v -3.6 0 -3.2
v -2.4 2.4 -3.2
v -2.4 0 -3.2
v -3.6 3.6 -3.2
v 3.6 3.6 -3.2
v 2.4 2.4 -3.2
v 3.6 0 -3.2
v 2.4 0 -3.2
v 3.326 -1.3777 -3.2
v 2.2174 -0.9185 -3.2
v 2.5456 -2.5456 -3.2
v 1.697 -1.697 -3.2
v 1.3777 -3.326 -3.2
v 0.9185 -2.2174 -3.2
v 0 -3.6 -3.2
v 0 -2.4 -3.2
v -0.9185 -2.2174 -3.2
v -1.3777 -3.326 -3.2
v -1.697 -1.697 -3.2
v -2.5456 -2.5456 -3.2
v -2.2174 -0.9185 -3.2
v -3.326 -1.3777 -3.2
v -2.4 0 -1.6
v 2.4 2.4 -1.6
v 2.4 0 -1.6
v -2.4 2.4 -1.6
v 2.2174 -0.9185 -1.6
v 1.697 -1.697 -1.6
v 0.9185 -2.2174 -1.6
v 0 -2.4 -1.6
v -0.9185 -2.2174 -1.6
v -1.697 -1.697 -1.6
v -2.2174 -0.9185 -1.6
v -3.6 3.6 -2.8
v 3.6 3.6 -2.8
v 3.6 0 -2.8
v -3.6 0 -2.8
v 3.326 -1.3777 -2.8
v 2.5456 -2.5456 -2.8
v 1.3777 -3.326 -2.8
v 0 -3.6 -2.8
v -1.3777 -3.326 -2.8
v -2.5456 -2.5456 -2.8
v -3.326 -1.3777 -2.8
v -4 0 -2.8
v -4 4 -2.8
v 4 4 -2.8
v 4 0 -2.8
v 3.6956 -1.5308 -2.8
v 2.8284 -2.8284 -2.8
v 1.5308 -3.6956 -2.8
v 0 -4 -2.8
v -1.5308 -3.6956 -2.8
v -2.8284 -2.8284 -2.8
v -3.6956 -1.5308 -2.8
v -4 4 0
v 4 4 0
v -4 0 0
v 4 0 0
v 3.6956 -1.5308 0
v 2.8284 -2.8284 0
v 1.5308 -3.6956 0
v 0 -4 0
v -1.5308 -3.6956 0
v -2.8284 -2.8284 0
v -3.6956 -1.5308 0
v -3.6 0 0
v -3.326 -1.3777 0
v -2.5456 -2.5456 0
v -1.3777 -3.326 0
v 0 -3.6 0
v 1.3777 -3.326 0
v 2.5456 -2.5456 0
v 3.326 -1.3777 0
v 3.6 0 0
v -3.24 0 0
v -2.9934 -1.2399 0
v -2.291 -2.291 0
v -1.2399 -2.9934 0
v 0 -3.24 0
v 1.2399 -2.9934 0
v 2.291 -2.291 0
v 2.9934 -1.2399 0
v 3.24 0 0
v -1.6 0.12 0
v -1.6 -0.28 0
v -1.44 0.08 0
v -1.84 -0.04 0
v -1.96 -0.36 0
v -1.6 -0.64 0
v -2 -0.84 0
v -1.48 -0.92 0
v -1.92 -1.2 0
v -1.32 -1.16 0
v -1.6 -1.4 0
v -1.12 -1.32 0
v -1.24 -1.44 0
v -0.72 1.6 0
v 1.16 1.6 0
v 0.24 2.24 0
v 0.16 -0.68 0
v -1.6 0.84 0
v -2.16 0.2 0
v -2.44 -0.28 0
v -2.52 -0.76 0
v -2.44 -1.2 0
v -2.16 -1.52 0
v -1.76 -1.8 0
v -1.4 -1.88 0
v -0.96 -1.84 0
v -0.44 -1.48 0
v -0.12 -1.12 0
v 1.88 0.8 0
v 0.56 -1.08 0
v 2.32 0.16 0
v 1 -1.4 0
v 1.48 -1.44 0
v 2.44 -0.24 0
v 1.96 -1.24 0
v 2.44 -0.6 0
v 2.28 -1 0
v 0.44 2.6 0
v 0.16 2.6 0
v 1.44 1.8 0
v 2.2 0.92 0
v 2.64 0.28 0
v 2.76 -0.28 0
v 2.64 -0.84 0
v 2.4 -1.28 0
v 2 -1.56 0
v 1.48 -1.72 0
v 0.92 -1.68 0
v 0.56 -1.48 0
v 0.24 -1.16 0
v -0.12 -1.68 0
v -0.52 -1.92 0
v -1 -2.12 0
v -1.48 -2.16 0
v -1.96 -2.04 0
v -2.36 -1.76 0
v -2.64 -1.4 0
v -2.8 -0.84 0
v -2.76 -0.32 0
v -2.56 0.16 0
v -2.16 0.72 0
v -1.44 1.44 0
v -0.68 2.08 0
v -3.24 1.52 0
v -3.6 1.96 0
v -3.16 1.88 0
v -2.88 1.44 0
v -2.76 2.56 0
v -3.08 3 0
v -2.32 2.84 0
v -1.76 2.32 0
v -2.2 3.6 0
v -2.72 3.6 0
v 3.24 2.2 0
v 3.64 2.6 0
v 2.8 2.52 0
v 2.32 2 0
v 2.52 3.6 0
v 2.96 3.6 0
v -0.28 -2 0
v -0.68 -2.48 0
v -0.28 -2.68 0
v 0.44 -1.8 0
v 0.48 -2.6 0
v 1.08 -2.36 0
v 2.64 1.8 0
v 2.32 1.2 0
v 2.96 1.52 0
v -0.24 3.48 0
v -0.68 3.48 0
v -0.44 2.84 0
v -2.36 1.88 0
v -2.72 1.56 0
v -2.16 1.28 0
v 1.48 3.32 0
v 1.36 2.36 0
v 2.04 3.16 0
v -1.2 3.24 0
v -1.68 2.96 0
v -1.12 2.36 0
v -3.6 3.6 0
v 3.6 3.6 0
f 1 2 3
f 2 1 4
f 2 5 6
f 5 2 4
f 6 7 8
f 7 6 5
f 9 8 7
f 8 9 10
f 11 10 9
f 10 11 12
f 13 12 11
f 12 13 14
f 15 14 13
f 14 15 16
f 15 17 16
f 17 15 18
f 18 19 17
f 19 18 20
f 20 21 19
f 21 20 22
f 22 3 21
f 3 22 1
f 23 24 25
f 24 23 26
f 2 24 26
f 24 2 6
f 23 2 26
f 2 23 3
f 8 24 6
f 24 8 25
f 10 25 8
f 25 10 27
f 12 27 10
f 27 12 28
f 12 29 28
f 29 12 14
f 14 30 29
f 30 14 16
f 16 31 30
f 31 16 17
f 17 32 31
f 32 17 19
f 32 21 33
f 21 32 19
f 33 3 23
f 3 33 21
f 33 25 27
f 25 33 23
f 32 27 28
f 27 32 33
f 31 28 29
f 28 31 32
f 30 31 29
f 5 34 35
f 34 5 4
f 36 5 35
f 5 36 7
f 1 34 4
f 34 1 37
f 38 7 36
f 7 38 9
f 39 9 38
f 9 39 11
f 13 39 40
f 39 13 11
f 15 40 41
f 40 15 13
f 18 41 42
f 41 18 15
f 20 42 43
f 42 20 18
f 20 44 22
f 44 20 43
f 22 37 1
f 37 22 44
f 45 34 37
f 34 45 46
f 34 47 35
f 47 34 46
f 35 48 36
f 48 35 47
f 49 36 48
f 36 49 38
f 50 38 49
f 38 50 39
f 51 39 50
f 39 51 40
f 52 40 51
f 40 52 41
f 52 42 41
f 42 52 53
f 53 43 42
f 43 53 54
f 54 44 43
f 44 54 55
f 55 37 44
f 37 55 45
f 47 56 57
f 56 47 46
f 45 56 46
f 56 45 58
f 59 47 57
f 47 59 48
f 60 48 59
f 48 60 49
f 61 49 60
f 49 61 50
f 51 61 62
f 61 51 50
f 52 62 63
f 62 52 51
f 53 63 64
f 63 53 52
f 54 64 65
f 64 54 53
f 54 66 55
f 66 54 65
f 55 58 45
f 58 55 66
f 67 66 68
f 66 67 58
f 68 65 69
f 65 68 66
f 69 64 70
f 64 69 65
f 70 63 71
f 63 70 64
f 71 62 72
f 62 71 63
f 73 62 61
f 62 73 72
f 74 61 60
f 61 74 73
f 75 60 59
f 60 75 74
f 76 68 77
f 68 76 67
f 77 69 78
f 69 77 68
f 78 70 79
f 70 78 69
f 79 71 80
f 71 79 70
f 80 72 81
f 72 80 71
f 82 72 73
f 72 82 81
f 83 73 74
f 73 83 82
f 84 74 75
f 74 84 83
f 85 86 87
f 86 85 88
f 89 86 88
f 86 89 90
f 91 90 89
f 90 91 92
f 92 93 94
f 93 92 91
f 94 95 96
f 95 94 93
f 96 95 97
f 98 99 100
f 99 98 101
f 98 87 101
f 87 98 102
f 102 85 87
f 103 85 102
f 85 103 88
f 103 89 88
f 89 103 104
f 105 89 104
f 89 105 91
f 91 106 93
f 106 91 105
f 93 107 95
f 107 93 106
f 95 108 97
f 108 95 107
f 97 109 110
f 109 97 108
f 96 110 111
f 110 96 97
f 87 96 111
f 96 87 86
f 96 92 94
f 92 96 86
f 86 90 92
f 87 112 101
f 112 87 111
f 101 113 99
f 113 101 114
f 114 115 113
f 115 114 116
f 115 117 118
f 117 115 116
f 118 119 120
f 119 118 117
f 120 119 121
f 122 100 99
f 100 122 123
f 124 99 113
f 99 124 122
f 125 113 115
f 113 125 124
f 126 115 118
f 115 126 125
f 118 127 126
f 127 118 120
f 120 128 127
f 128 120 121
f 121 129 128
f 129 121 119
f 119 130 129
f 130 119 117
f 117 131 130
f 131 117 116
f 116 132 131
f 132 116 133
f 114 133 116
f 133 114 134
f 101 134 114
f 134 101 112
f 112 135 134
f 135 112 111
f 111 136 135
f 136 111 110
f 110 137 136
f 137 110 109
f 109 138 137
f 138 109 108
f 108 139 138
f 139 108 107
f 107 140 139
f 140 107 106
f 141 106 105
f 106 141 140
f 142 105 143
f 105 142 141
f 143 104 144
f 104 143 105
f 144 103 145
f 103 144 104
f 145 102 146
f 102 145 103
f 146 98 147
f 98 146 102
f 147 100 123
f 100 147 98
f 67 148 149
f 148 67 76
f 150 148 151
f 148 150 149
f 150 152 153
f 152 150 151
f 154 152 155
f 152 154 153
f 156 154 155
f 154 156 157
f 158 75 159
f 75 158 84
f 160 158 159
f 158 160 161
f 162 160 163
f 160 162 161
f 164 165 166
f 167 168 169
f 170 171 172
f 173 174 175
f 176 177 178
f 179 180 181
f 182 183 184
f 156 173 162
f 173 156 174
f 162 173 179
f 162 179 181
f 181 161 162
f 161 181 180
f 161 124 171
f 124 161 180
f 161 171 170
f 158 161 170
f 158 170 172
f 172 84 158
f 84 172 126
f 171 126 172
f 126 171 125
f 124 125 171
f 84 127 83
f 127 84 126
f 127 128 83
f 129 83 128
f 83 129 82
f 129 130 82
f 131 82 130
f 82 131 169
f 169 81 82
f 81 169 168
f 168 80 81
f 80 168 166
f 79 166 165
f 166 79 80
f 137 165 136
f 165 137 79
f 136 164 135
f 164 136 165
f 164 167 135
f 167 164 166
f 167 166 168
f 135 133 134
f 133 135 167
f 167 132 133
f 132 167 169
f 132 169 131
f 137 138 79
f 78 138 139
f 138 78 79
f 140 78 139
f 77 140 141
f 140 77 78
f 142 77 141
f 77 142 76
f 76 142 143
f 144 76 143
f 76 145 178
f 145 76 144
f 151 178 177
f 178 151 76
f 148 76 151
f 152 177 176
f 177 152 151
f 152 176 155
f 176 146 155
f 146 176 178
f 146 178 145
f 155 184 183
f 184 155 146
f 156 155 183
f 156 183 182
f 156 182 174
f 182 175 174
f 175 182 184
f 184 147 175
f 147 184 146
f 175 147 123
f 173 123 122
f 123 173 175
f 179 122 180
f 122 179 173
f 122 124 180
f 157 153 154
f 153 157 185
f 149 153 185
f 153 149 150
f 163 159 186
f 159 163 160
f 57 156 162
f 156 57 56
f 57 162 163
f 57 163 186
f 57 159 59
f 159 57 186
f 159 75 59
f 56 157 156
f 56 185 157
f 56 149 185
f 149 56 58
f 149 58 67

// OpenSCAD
// file: ../p/2-4edge.scad
use <../lib.scad>
function ldraw_lib__2_4edge() = [
// 0 Circle 0.5
// 0 Name: 2-4edge.dat
// 0 Author: James Jessiman
// 0 !LDRAW_ORG Primitive UPDATE 2017-01
// 0 !LICENSE Licensed under CC BY 4.0 : see CAreadme.txt
// 
// 0 BFC CERTIFY CCW
  [0,"BFC","CERTIFY"],
  [0,"BFC","CCW"],
// 
// 0 !HISTORY 2007-06-24 [PTadmin] Header formatted for Contributor Agreement
// 0 !HISTORY 2008-07-01 [PTadmin] Official Update 2008-01
// 0 !HISTORY 2017-01-15 [Steffen] BFCed
// 0 !HISTORY 2017-12-30 [PTadmin] Official Update 2017-01
// 
// 
// 2 24 1 0 0 0.9239 0 0.3827
  [2,24,1,0,0,0.9239,0,0.3827],
// 2 24 0.9239 0 0.3827 0.7071 0 0.7071
  [2,24,0.9239,0,0.3827,0.7071,0,0.7071],
// 2 24 0.7071 0 0.7071 0.3827 0 0.9239
  [2,24,0.7071,0,0.7071,0.3827,0,0.9239],
// 2 24 0.3827 0 0.9239 0 0 1
  [2,24,0.3827,0,0.9239,0,0,1],
// 2 24 0 0 1 -0.3827 0 0.9239
  [2,24,0,0,1,-0.3827,0,0.9239],
// 2 24 -0.3827 0 0.9239 -0.7071 0 0.7071
  [2,24,-0.3827,0,0.9239,-0.7071,0,0.7071],
// 2 24 -0.7071 0 0.7071 -0.9239 0 0.3827
  [2,24,-0.7071,0,0.7071,-0.9239,0,0.3827],
// 2 24 -0.9239 0 0.3827 -1 0 0
  [2,24,-0.9239,0,0.3827,-1,0,0],
];
module ldraw_lib__2_4edge(step=0, col=false, unit=2/5, alt=false, line=0.2, solid=!$preview)
    makepoly(ldraw_lib__2_4edge(), step=step, col=col, unit=unit, alt=alt, line=line, solid=solid);
ldraw_lib__2_4edge(line=0.2);
// file: ../p/2-4cyli.scad
use <../lib.scad>
function ldraw_lib__2_4cyli() = [
// 0 Cylinder 0.5
// 0 Name: 2-4cyli.dat
// 0 Author: James Jessiman
// 0 !LDRAW_ORG Primitive UPDATE 2005-01
// 0 !LICENSE Licensed under CC BY 4.0 : see CAreadme.txt
// 
// 0 BFC CERTIFY CCW
  [0,"BFC","CERTIFY"],
  [0,"BFC","CCW"],
// 
// 0 !HISTORY 2002-03-23 [sbliss] Added BFC statement; compacted code
// 0 !HISTORY 2002-04-25 [PTadmin] Official Update 2002-02
// 0 !HISTORY 2004-12-11 [nielsk] Recreated using Primitive Generator, Edge lines fixed, BFC changed to CCW
// 0 !HISTORY 2005-12-28 [PTadmin] Official Update 2005-01
// 0 !HISTORY 2007-06-24 [PTadmin] Header formatted for Contributor Agreement
// 0 !HISTORY 2008-07-01 [PTadmin] Official Update 2008-01
// 
// 
// 4 16 .9239 1 .3827 .9239 0 .3827 1 0 0 1 1 0
  [4,16,.9239,1,.3827,.9239,0,.3827,1,0,0,1,1,0],
// 4 16 .7071 1 .7071 .7071 0 .7071 .9239 0 .3827 .9239 1 .3827
  [4,16,.7071,1,.7071,.7071,0,.7071,.9239,0,.3827,.9239,1,.3827],
// 4 16 .3827 1 .9239 .3827 0 .9239 .7071 0 .7071 .7071 1 .7071
  [4,16,.3827,1,.9239,.3827,0,.9239,.7071,0,.7071,.7071,1,.7071],
// 4 16 0 1 1 0 0 1 .3827 0 .9239 .3827 1 .9239
  [4,16,0,1,1,0,0,1,.3827,0,.9239,.3827,1,.9239],
// 4 16 -.3827 1 .9239 -.3827 0 .9239 0 0 1 0 1 1
  [4,16,-.3827,1,.9239,-.3827,0,.9239,0,0,1,0,1,1],
// 4 16 -.7071 1 .7071 -.7071 0 .7071 -.3827 0 .9239 -.3827 1 .9239
  [4,16,-.7071,1,.7071,-.7071,0,.7071,-.3827,0,.9239,-.3827,1,.9239],
// 4 16 -.9239 1 .3827 -.9239 0 .3827 -.7071 0 .7071 -.7071 1 .7071
  [4,16,-.9239,1,.3827,-.9239,0,.3827,-.7071,0,.7071,-.7071,1,.7071],
// 4 16 -1 1 0 -1 0 0 -.9239 0 .3827 -.9239 1 .3827
  [4,16,-1,1,0,-1,0,0,-.9239,0,.3827,-.9239,1,.3827],
// 5 24 1 1 0 1 0 0 1 1 -.4142 .9239 1 .3827
  [5,24,1,1,0,1,0,0,1,1,-.4142,.9239,1,.3827],
// 5 24 .9239 1 .3827 .9239 0 .3827 1 1 0 .7071 1 .7071
  [5,24,.9239,1,.3827,.9239,0,.3827,1,1,0,.7071,1,.7071],
// 5 24 .7071 1 .7071 .7071 0 .7071 .9239 1 .3827 .3827 1 .9239
  [5,24,.7071,1,.7071,.7071,0,.7071,.9239,1,.3827,.3827,1,.9239],
// 5 24 .3827 1 .9239 .3827 0 .9239 .7071 1 .7071 0 1 1
  [5,24,.3827,1,.9239,.3827,0,.9239,.7071,1,.7071,0,1,1],
// 5 24 0 1 1 0 0 1 .3827 1 .9239 -.3827 1 .9239
  [5,24,0,1,1,0,0,1,.3827,1,.9239,-.3827,1,.9239],
// 5 24 -.3827 1 .9239 -.3827 0 .9239 0 1 1 -.7071 1 .7071
  [5,24,-.3827,1,.9239,-.3827,0,.9239,0,1,1,-.7071,1,.7071],
// 5 24 -.7071 1 .7071 -.7071 0 .7071 -.3827 1 .9239 -.9239 1 .3827
  [5,24,-.7071,1,.7071,-.7071,0,.7071,-.3827,1,.9239,-.9239,1,.3827],
// 5 24 -.9239 1 .3827 -.9239 0 .3827 -.7071 1 .7071 -1 1 0
  [5,24,-.9239,1,.3827,-.9239,0,.3827,-.7071,1,.7071,-1,1,0],
// 5 24 -1 1 0 -1 0 0 -.9239 1 .3827 -1 1 -.4142
  [5,24,-1,1,0,-1,0,0,-.9239,1,.3827,-1,1,-.4142],
// 0
];
module ldraw_lib__2_4cyli(step=0, col=false, unit=2/5, alt=false, line=0.2, solid=!$preview)
    makepoly(ldraw_lib__2_4cyli(), step=step, col=col, unit=unit, alt=alt, line=line, solid=solid);
ldraw_lib__2_4cyli(line=0.2);
// file: ../p/empty.scad
use <../lib.scad>
function ldraw_lib__empty() = [
// 0 Empty
// 0 Name: empty.dat
// 0 Author: Steffen [Steffen]
// 0 !LDRAW_ORG Primitive UPDATE 2015-01
// 0 !LICENSE Licensed under CC BY 4.0 : see CAreadme.txt
// 
// 0 BFC CERTIFY CCW
  [0,"BFC","CERTIFY"],
  [0,"BFC","CCW"],
// 
// 0 !HISTORY 2015-10-11 [PTadmin] Official Update 2015-01
// 
// 
// 0 // Tool MLCad cannot handle really empty files. This file is used as a workaround.
// 0 // It exceptionally contains forbidden non-LDRAW standard syntax to satisfy MLCad until it is fixed OR a different editor has become the de-facto LDRAW standard.
// 0 // The line being used here is an "impossible" conditional line which never should be visible,
// 0 // additionally hidden by a syntax explicitly hiding it from displaying.
// 
// 0 MLCAD HIDE 5 24 0 0 0 0.0001 0 0 0.0001 -0.0001 0 0 0 0
];
module ldraw_lib__empty(step=0, col=false, unit=2/5, alt=false, line=0.2, solid=!$preview)
    makepoly(ldraw_lib__empty(), step=step, col=col, unit=unit, alt=alt, line=line, solid=solid);
ldraw_lib__empty(line=0.2);
// file: ../p/box4-4a.scad
use <../lib.scad>
function ldraw_lib__box4_4a() = [
// 0 Box with  4 Faces without  4 Adjacent Edges
// 0 Name: box4-4a.dat
// 0 Author: Willy Tschager [Holly-Wood]
// 0 !LDRAW_ORG Primitive UPDATE 2024-01
// 0 !LICENSE Licensed under CC BY 4.0 : see CAreadme.txt
// 
// 0 BFC CERTIFY CCW
  [0,"BFC","CERTIFY"],
  [0,"BFC","CCW"],
// 
// 0 !HISTORY 1998-07-15 [PTadmin] Official Update 1998-07
// 0 !HISTORY 2002-12-13 [hafhead] Made BFC compliant
// 0 !HISTORY 2003-03-12 [PTadmin] Official Update 2003-01
// 0 !HISTORY 2007-06-24 [PTadmin] Header formatted for Contributor Agreement
// 0 !HISTORY 2008-07-01 [PTadmin] Official Update 2008-01
// 0 !HISTORY 2012-02-16 [Philo] Changed to CCW
// 0 !HISTORY 2012-03-30 [PTadmin] Official Update 2012-01
// 0 !HISTORY 2024-01-03 [Holly-Wood] Complete re-write, original by Manfred Moolhuysen
// 0 !HISTORY 2024-01-29 [OrionP] Official Update 2024-01
// 
// 2 24 -1 1 -1 -1 1 1
  [2,24,-1,1,-1,-1,1,1],
// 2 24 1 1 1 1 1 -1
  [2,24,1,1,1,1,1,-1],
// 2 24 -1 1 1 1 1 1
  [2,24,-1,1,1,1,1,1],
// 4 16 1 1 1 1 1 -1 -1 1 -1 -1 1 1
  [4,16,1,1,1,1,1,-1,-1,1,-1,-1,1,1],
// 
// 2 24 -1 0 -1 -1 0 1
  [2,24,-1,0,-1,-1,0,1],
// 4 16 -1 1 1 -1 1 -1 -1 0 -1 -1 0 1
  [4,16,-1,1,1,-1,1,-1,-1,0,-1,-1,0,1],
// 
// 2 24 1 0 1 1 0 -1
  [2,24,1,0,1,1,0,-1],
// 4 16 1 1 -1 1 1 1 1 0 1 1 0 -1
  [4,16,1,1,-1,1,1,1,1,0,1,1,0,-1],
// 
// 2 24 1 1 1 1 0 1
  [2,24,1,1,1,1,0,1],
// 2 24 -1 1 1 -1 0 1
  [2,24,-1,1,1,-1,0,1],
// 2 24 -1 0 1 1 0 1
  [2,24,-1,0,1,1,0,1],
// 4 16 1 1 1 -1 1 1 -1 0 1 1 0 1
  [4,16,1,1,1,-1,1,1,-1,0,1,1,0,1],
];
module ldraw_lib__box4_4a(step=0, col=false, unit=2/5, alt=false, line=0.2, solid=!$preview)
    makepoly(ldraw_lib__box4_4a(), step=step, col=col, unit=unit, alt=alt, line=line, solid=solid);
ldraw_lib__box4_4a(line=0.2);
// file: ../p/box3u4a.scad
use <../lib.scad>
function ldraw_lib__box3u4a() = [
// 0 Box with 3 Faces without 4 Adjacent Edges
// 0 Name: box3u4a.dat
// 0 Author: Niels Karsdorp [nielsk]
// 0 !LDRAW_ORG Primitive UPDATE 2009-01
// 0 !LICENSE Licensed under CC BY 4.0 : see CAreadme.txt
// 
// 0 BFC CERTIFY CCW
  [0,"BFC","CERTIFY"],
  [0,"BFC","CCW"],
// 
// 0 !HISTORY 2009-05-02 [PTadmin] Official Update 2009-01
// 
// 
// 2 24 1 1 1 -1 1 1
  [2,24,1,1,1,-1,1,1],
// 2 24 -1 1 -1 1 1 -1
  [2,24,-1,1,-1,1,1,-1],
// 2 24 1 1 1 1 1 -1
  [2,24,1,1,1,1,1,-1],
// 2 24 -1 1 1 -1 1 -1
  [2,24,-1,1,1,-1,1,-1],
// 2 24 1 1 1 1 0 1
  [2,24,1,1,1,1,0,1],
// 2 24 1 1 -1 1 0 -1
  [2,24,1,1,-1,1,0,-1],
// 2 24 -1 1 1 -1 0 1
  [2,24,-1,1,1,-1,0,1],
// 2 24 -1 1 -1 -1 0 -1
  [2,24,-1,1,-1,-1,0,-1],
// 4 16 -1 1 -1 -1 1 1 1 1 1 1 1 -1
  [4,16,-1,1,-1,-1,1,1,1,1,1,1,1,-1],
// 4 16 -1 1 1 -1 0 1 1 0 1 1 1 1
  [4,16,-1,1,1,-1,0,1,1,0,1,1,1,1],
// 4 16 1 1 -1 1 0 -1 -1 0 -1 -1 1 -1
  [4,16,1,1,-1,1,0,-1,-1,0,-1,-1,1,-1],
// 0
];
module ldraw_lib__box3u4a(step=0, col=false, unit=2/5, alt=false, line=0.2, solid=!$preview)
    makepoly(ldraw_lib__box3u4a(), step=step, col=col, unit=unit, alt=alt, line=line, solid=solid);
ldraw_lib__box3u4a(line=0.2);
// file: ../p/2-4ring2.scad
use <../lib.scad>
function ldraw_lib__2_4ring2() = [
// 0 Ring  2 x 0.5
// 0 Name: 2-4ring2.dat
// 0 Author: Chris Dee [cwdee]
// 0 !LDRAW_ORG Primitive UPDATE 2012-01
// 0 !LICENSE Licensed under CC BY 4.0 : see CAreadme.txt
// 
// 0 BFC CERTIFY CCW
  [0,"BFC","CERTIFY"],
  [0,"BFC","CCW"],
// 
// 0 !HISTORY 2001-10-26 [PTadmin] Official Update 2001-01
// 0 !HISTORY 2007-06-24 [PTadmin] Header formatted for Contributor Agreement
// 0 !HISTORY 2008-07-01 [PTadmin] Official Update 2008-01
// 0 !HISTORY 2012-02-16 [Philo] Changed to CCW
// 0 !HISTORY 2012-03-30 [PTadmin] Official Update 2012-01
// 
// 
// 4 16 3 0 0 2.7717 0 1.1481 1.8478 0 0.7654 2 0 0
  [4,16,3,0,0,2.7717,0,1.1481,1.8478,0,0.7654,2,0,0],
// 4 16 2.7717 0 1.1481 2.1213 0 2.1213 1.4142 0 1.4142 1.8478 0 0.7654
  [4,16,2.7717,0,1.1481,2.1213,0,2.1213,1.4142,0,1.4142,1.8478,0,0.7654],
// 4 16 2.1213 0 2.1213 1.1481 0 2.7717 0.7654 0 1.8478 1.4142 0 1.4142
  [4,16,2.1213,0,2.1213,1.1481,0,2.7717,0.7654,0,1.8478,1.4142,0,1.4142],
// 4 16 1.1481 0 2.7717 0 0 3 0 0 2 0.7654 0 1.8478
  [4,16,1.1481,0,2.7717,0,0,3,0,0,2,0.7654,0,1.8478],
// 4 16 0 0 3 -1.1481 0 2.7717 -0.7654 0 1.8478 0 0 2
  [4,16,0,0,3,-1.1481,0,2.7717,-0.7654,0,1.8478,0,0,2],
// 4 16 -1.1481 0 2.7717 -2.1213 0 2.1213 -1.4142 0 1.4142 -0.7654 0 1.8478
  [4,16,-1.1481,0,2.7717,-2.1213,0,2.1213,-1.4142,0,1.4142,-0.7654,0,1.8478],
// 4 16 -2.1213 0 2.1213 -2.7717 0 1.1481 -1.8478 0 0.7654 -1.4142 0 1.4142
  [4,16,-2.1213,0,2.1213,-2.7717,0,1.1481,-1.8478,0,0.7654,-1.4142,0,1.4142],
// 4 16 -2.7717 0 1.1481 -3 0 0 -2 0 0 -1.8478 0 0.7654
  [4,16,-2.7717,0,1.1481,-3,0,0,-2,0,0,-1.8478,0,0.7654],
];
module ldraw_lib__2_4ring2(step=0, col=false, unit=2/5, alt=false, line=0.2, solid=!$preview)
    makepoly(ldraw_lib__2_4ring2(), step=step, col=col, unit=unit, alt=alt, line=line, solid=solid);
ldraw_lib__2_4ring2(line=0.2);
// file: ../p/2-4cylo.scad
use <../lib.scad>
use <2-4cyli.scad>
use <2-4edge.scad>
function ldraw_lib__2_4cylo() = [
// 0 Cylinder Open 0.5
// 0 Name: 2-4cylo.dat
// 0 Author: Max Martin Richter [MMR1988]
// 0 !LDRAW_ORG Primitive UPDATE 2010-03
// 0 !LICENSE Licensed under CC BY 4.0 : see CAreadme.txt
// 
// 0 BFC CERTIFY CCW
  [0,"BFC","CERTIFY"],
  [0,"BFC","CCW"],
// 
// 0 !HISTORY 2010-12-31 [PTadmin] Official Update 2010-03
// 
// 
// 1 16 0 0 0 1 0 0 0 1 0 0 0 1 2-4edge.dat
  [1,16,0,0,0,1,0,0,0,1,0,0,0,1, ldraw_lib__2_4edge()],
// 1 16 0 1 0 1 0 0 0 1 0 0 0 1 2-4edge.dat
  [1,16,0,1,0,1,0,0,0,1,0,0,0,1, ldraw_lib__2_4edge()],
// 1 16 0 0 0 1 0 0 0 1 0 0 0 1 2-4cyli.dat
  [1,16,0,0,0,1,0,0,0,1,0,0,0,1, ldraw_lib__2_4cyli()],
];
module ldraw_lib__2_4cylo(step=0, col=false, unit=2/5, alt=false, line=0.2, solid=!$preview)
    makepoly(ldraw_lib__2_4cylo(), step=step, col=col, unit=unit, alt=alt, line=line, solid=solid);
ldraw_lib__2_4cylo(line=0.2);
// file: ../p/2-4chrd.scad
use <../lib.scad>
function ldraw_lib__2_4chrd() = [
// 0 Chord 0.5
// 0 Name: 2-4chrd.dat
// 0 Author: Philippe Hurbain [Philo]
// 0 !LDRAW_ORG Primitive UPDATE 2014-01
// 0 !LICENSE Licensed under CC BY 4.0 : see CAreadme.txt
// 
// 0 BFC CERTIFY CCW
  [0,"BFC","CERTIFY"],
  [0,"BFC","CCW"],
// 
// 0 !HISTORY 2014-06-21 [PTadmin] Official Update 2014-01
// 
// 
// 4 16 0.9239 0 0.3827 -0.9239 0 0.3827 -1 0 0 1 0 0
  [4,16,0.9239,0,0.3827,-0.9239,0,0.3827,-1,0,0,1,0,0],
// 4 16 0.7071 0 0.7071 -0.7071 0 0.7071 -0.9239 0 0.3827 0.9239 0 0.3827
  [4,16,0.7071,0,0.7071,-0.7071,0,0.7071,-0.9239,0,0.3827,0.9239,0,0.3827],
// 4 16 0.3827 0 0.9239 -0.3827 0 0.9239 -0.7071 0 0.7071 0.7071 0 0.7071
  [4,16,0.3827,0,0.9239,-0.3827,0,0.9239,-0.7071,0,0.7071,0.7071,0,0.7071],
// 3 16 0 0 1 -0.3827 0 0.9239 0.3827 0 0.9239
  [3,16,0,0,1,-0.3827,0,0.9239,0.3827,0,0.9239],
];
module ldraw_lib__2_4chrd(step=0, col=false, unit=2/5, alt=false, line=0.2, solid=!$preview)
    makepoly(ldraw_lib__2_4chrd(), step=step, col=col, unit=unit, alt=alt, line=line, solid=solid);
ldraw_lib__2_4chrd(line=0.2);
// file: ../p/1-16chrd.scad
use <../lib.scad>
use <empty.scad>
function ldraw_lib__1_16chrd() = [
// 0 Chord 0.0625
// 0 Name: 1-16chrd.dat
// 0 Author: Philippe Hurbain [Philo]
// 0 !LDRAW_ORG Primitive UPDATE 2015-01
// 0 !LICENSE Licensed under CC BY 4.0 : see CAreadme.txt
// 
// 0 BFC CERTIFY CCW
  [0,"BFC","CERTIFY"],
  [0,"BFC","CCW"],
// 
// 0 !HISTORY 2015-10-11 [PTadmin] Official Update 2015-01
// 
// 
// 0 // This file is intentionally empty because at the current \P resolution,
// 0 // an 1-16chrd is actually empty. However, this file still is present
// 0 // to allow tools to do primitives substition and fill in a real chrd here,
// 0 // or, if desired, to substitute this with the hi-res 48\1-16chrd.
// 
// 0 // This file is based on an idea by Darats at http://forums.ldraw.org/read.php?19,14500,14500#msg-14500
// 
// 1 16 0 0 0 1 0 0 0 1 0 0 0 1 empty.dat
  [1,16,0,0,0,1,0,0,0,1,0,0,0,1, ldraw_lib__empty()],
];
module ldraw_lib__1_16chrd(step=0, col=false, unit=2/5, alt=false, line=0.2, solid=!$preview)
    makepoly(ldraw_lib__1_16chrd(), step=step, col=col, unit=unit, alt=alt, line=line, solid=solid);
ldraw_lib__1_16chrd(line=0.2);
// file: s/24246s02.scad
use <../../lib.scad>
use <../../p/2-4chrd.scad>
use <../../p/2-4cylo.scad>
use <../../p/2-4ring2.scad>
use <../../p/2-4ring9.scad>
use <../../p/box3u4a.scad>
use <../../p/box4-4a.scad>
function ldraw_lib__s__24246s02() = [
// 0 ~Tile  1 x  1 with Rounded End without Complete Top Face
// 0 Name: s\24246s02.dat
// 0 Author: Magnus Forsberg [MagFors]
// 0 !LDRAW_ORG Subpart UPDATE 2020-02
// 0 !LICENSE Licensed under CC BY 4.0 : see CAreadme.txt
// 
// 0 BFC CERTIFY CCW
  [0,"BFC","CERTIFY"],
  [0,"BFC","CCW"],
// 
// 0 !HISTORY 2020-09-05 [PTadmin] Official Update 2020-02
// 
// 
// 4 16 -9 8 0 -9 8 9 -6 8 6 -6 8 0
  [4,16,-9,8,0,-9,8,9,-6,8,6,-6,8,0],
// 4 16 -9 8 9 9 8 9 6 8 6 -6 8 6
  [4,16,-9,8,9,9,8,9,6,8,6,-6,8,6],
// 4 16 9 8 9 9 8 0 6 8 0 6 8 6
  [4,16,9,8,9,9,8,0,6,8,0,6,8,6],
// 1 16 0 8 0 3 0 0 0 -1 0 0 0 -3 2-4ring2.dat
  [1,16,0,8,0,3,0,0,0,-1,0,0,0,-3, ldraw_lib__2_4ring2()],
// 0 BFC INVERTNEXT
  [0,"BFC","INVERTNEXT"],
// 1 16 0 8 3 6 0 0 0 -4 0 0 0 3 box4-4a.dat
  [1,16,0,8,3,6,0,0,0,-4,0,0,0,3, ldraw_lib__box4_4a()],
// 0 BFC INVERTNEXT
  [0,"BFC","INVERTNEXT"],
// 1 16 0 4 0 6 0 0 0 4 0 0 0 -6 2-4cylo.dat
  [1,16,0,4,0,6,0,0,0,4,0,0,0,-6, ldraw_lib__2_4cylo()],
// 1 16 0 4 0 6 0 0 0 -4 0 0 0 -6 2-4chrd.dat
  [1,16,0,4,0,6,0,0,0,-4,0,0,0,-6, ldraw_lib__2_4chrd()],
// 1 16 0 7.5 0 0 0 9 0.5 0 0 0 9 0 box3u4a.dat
  [1,16,0,7.5,0,0,0,9,0.5,0,0,0,9,0, ldraw_lib__box3u4a()],
// 1 16 0 7 0 9 0 0 0 1 0 0 0 -9 2-4cylo.dat
  [1,16,0,7,0,9,0,0,0,1,0,0,0,-9, ldraw_lib__2_4cylo()],
// 4 16 -10 7 0 -10 7 10 -9 7 9 -9 7 0
  [4,16,-10,7,0,-10,7,10,-9,7,9,-9,7,0],
// 4 16 -10 7 10 10 7 10 9 7 9 -9 7 9
  [4,16,-10,7,10,10,7,10,9,7,9,-9,7,9],
// 4 16 10 7 10 10 7 0 9 7 0 9 7 9
  [4,16,10,7,10,10,7,0,9,7,0,9,7,9],
// 1 16 0 7 0 1 0 0 0 -1 0 0 0 -1 2-4ring9.dat
  [1,16,0,7,0,1,0,0,0,-1,0,0,0,-1, ldraw_lib__2_4ring9()],
// 1 16 0 3.5 0 0 0 -10 -3.5 0 0 0 10 0 box3u4a.dat
  [1,16,0,3.5,0,0,0,-10,-3.5,0,0,0,10,0, ldraw_lib__box3u4a()],
// 1 16 0 0 0 10 0 0 0 7 0 0 0 -10 2-4cylo.dat
  [1,16,0,0,0,10,0,0,0,7,0,0,0,-10, ldraw_lib__2_4cylo()],
];
module ldraw_lib__s__24246s02(step=0, col=false, unit=2/5, alt=false, line=0.2, solid=!$preview)
    makepoly(ldraw_lib__s__24246s02(), step=step, col=col, unit=unit, alt=alt, line=line, solid=solid);
ldraw_lib__s__24246s02(line=0.2);
// file: ../p/2-4ring9.scad
use <../lib.scad>
function ldraw_lib__2_4ring9() = [
// 0 Ring  9 x 0.5
// 0 Name: 2-4ring9.dat
// 0 Author: Willy Tschager [Holly-Wood]
// 0 !LDRAW_ORG Primitive UPDATE 2024-01
// 0 !LICENSE Licensed under CC BY 4.0 : see CAreadme.txt
// 
// 0 BFC CERTIFY CCW
  [0,"BFC","CERTIFY"],
  [0,"BFC","CCW"],
// 
// 0 !HISTORY 2009-09-03 [PTadmin] Official Update 2009-02
// 0 !HISTORY 2024-01-10 [Holly-Wood] Complete regeneration, original by guyvivan
// 0 !HISTORY 2024-01-29 [OrionP] Official Update 2024-01
// 
// 4 16 10 0 0 9.239 0 3.827 8.3151 0 3.4443 9 0 0
  [4,16,10,0,0,9.239,0,3.827,8.3151,0,3.4443,9,0,0],
// 4 16 9.239 0 3.827 7.071 0 7.071 6.3639 0 6.3639 8.3151 0 3.4443
  [4,16,9.239,0,3.827,7.071,0,7.071,6.3639,0,6.3639,8.3151,0,3.4443],
// 4 16 7.071 0 7.071 3.827 0 9.239 3.4443 0 8.3151 6.3639 0 6.3639
  [4,16,7.071,0,7.071,3.827,0,9.239,3.4443,0,8.3151,6.3639,0,6.3639],
// 4 16 3.827 0 9.239 0 0 10 0 0 9 3.4443 0 8.3151
  [4,16,3.827,0,9.239,0,0,10,0,0,9,3.4443,0,8.3151],
// 4 16 0 0 10 -3.827 0 9.239 -3.4443 0 8.3151 0 0 9
  [4,16,0,0,10,-3.827,0,9.239,-3.4443,0,8.3151,0,0,9],
// 4 16 -3.827 0 9.239 -7.071 0 7.071 -6.3639 0 6.3639 -3.4443 0 8.3151
  [4,16,-3.827,0,9.239,-7.071,0,7.071,-6.3639,0,6.3639,-3.4443,0,8.3151],
// 4 16 -7.071 0 7.071 -9.239 0 3.827 -8.3151 0 3.4443 -6.3639 0 6.3639
  [4,16,-7.071,0,7.071,-9.239,0,3.827,-8.3151,0,3.4443,-6.3639,0,6.3639],
// 4 16 -9.239 0 3.827 -10 0 0 -9 0 0 -8.3151 0 3.4443
  [4,16,-9.239,0,3.827,-10,0,0,-9,0,0,-8.3151,0,3.4443],
// 0 // Build by LDPartEditor (PrimGen 2.X)
];
module ldraw_lib__2_4ring9(step=0, col=false, unit=2/5, alt=false, line=0.2, solid=!$preview)
    makepoly(ldraw_lib__2_4ring9(), step=step, col=col, unit=unit, alt=alt, line=line, solid=solid);
ldraw_lib__2_4ring9(line=0.2);
// file: ../p/2-4ering.scad
use <../lib.scad>
use <1-16chrd.scad>
function ldraw_lib__2_4ering() = [
// 0 Adapter Ring Triangles to Normal 0.5
// 0 Name: 2-4ering.dat
// 0 Author: Damien Roux [Darats]
// 0 !LDRAW_ORG Primitive UPDATE 2019-03
// 0 !LICENSE Licensed under CC BY 4.0 : see CAreadme.txt
// 
// 0 BFC CERTIFY CCW
  [0,"BFC","CERTIFY"],
  [0,"BFC","CCW"],
// 
// 0 !HISTORY 2019-12-27 [PTadmin] Official Update 2019-03
// 
// 
// 0 // This file uses 1-16chrd (actually empty). It allows
// 0 // tools to do primitives substition and fill in a ring of chrd here,
// 0 // or, if desired, to substitute this with the hi-res 48\1-16chrd.
// 0 // This file is based on an idea by Darats at http://forums.ldraw.org/read.php?19,14500,14500#msg-14500
// 
// 1 16 0 0 0 1 0 0 0 1 0 0 0 1 1-16chrd.dat
  [1,16,0,0,0,1,0,0,0,1,0,0,0,1, ldraw_lib__1_16chrd()],
// 1 16 0 0 0 0 0 -1 0 1 0 1 0 0 1-16chrd.dat
  [1,16,0,0,0,0,0,-1,0,1,0,1,0,0, ldraw_lib__1_16chrd()],
// 1 16 0 0 0 0.38268 0 -0.92388 0 1 0 0.92388 0 0.38268 1-16chrd.dat
  [1,16,0,0,0,0.38268,0,-0.92388,0,1,0,0.92388,0,0.38268, ldraw_lib__1_16chrd()],
// 1 16 0 0 0 0.70711 0 -0.70711 0 1 0 0.70711 0 0.70711 1-16chrd.dat
  [1,16,0,0,0,0.70711,0,-0.70711,0,1,0,0.70711,0,0.70711, ldraw_lib__1_16chrd()],
// 1 16 0 0 0 0.92388 0 -0.38268 0 1 0 0.38268 0 0.92388 1-16chrd.dat
  [1,16,0,0,0,0.92388,0,-0.38268,0,1,0,0.38268,0,0.92388, ldraw_lib__1_16chrd()],
// 1 16 0 0 0 -0.92388 0 -0.38268 0 1 0 0.38268 0 -0.92388 1-16chrd.dat
  [1,16,0,0,0,-0.92388,0,-0.38268,0,1,0,0.38268,0,-0.92388, ldraw_lib__1_16chrd()],
// 1 16 0 0 0 -0.70711 0 -0.70711 0 1 0 0.70711 0 -0.70711 1-16chrd.dat
  [1,16,0,0,0,-0.70711,0,-0.70711,0,1,0,0.70711,0,-0.70711, ldraw_lib__1_16chrd()],
// 1 16 0 0 0 -0.38268 0 -0.92388 0 1 0 0.92388 0 -0.38268 1-16chrd.dat
  [1,16,0,0,0,-0.38268,0,-0.92388,0,1,0,0.92388,0,-0.38268, ldraw_lib__1_16chrd()],
];
module ldraw_lib__2_4ering(step=0, col=false, unit=2/5, alt=false, line=0.2, solid=!$preview)
    makepoly(ldraw_lib__2_4ering(), step=step, col=col, unit=unit, alt=alt, line=line, solid=solid);
ldraw_lib__2_4ering(line=0.2);
// main file
use <../lib.scad>
use <../p/2-4ering.scad>
use <../p/2-4ring9.scad>
use <s/24246s02.scad>
function ldraw_lib__24246p08() = [
// 0 Tile  1 x  1 with Rounded End with Coral Heart on Yellow Background Pattern
// 0 Name: 24246p08.dat
// 0 Author: Takeshi Takahashi [RainbowDolphin]
// 0 !LDRAW_ORG Part UPDATE 2024-08
// 0 !LICENSE Licensed under CC BY 4.0 : see CAreadme.txt
// 
// 0 BFC CERTIFY CCW
  [0,"BFC","CERTIFY"],
  [0,"BFC","CCW"],
// 
// 0 !KEYWORDS bracelet, Bricklink 24246pb004, Dots, explosion, Power
// 0 !KEYWORDS Rebrickable 24246pr0004, Set 41919
// 
// 0 !HISTORY 2024-09-30 [OrionP] Official Update 2024-08
// 
// 
// 1 16 0 0 0 1 0 0 0 1 0 0 0 1 s\24246s02.dat
  [1,16,0,0,0,1,0,0,0,1,0,0,0,1, ldraw_lib__s__24246s02()],
// 1 16 0 0 0 -1 0 0 0 1 0 0 0 -1 2-4ring9.dat
  [1,16,0,0,0,-1,0,0,0,1,0,0,0,-1, ldraw_lib__2_4ring9()],
// 1 15 0 0 0 -0.9 0 0 0 1 0 0 0 -0.9 2-4ring9.dat
  [1,15,0,0,0,-0.9,0,0,0,1,0,0,0,-0.9, ldraw_lib__2_4ring9()],
// 1 14 0 0 0 -8.1 0 0 0 1 0 0 0 -8.1 2-4ering.dat
  [1,14,0,0,0,-8.1,0,0,0,1,0,0,0,-8.1, ldraw_lib__2_4ering()],
// 4 0 -3.6 0 0.2 -4 0 0.3 -4.6 0 -0.1 -4 0 -0.7
  [4,0,-3.6,0,0.2,-4,0,0.3,-4.6,0,-0.1,-4,0,-0.7],
// 4 0 -4 0 -0.7 -4.6 0 -0.1 -4.9 0 -0.9 -4 0 -1.6
  [4,0,-4,0,-0.7,-4.6,0,-0.1,-4.9,0,-0.9,-4,0,-1.6],
// 4 0 -4 0 -1.6 -4.9 0 -0.9 -5 0 -2.1 -3.7 0 -2.3
  [4,0,-4,0,-1.6,-4.9,0,-0.9,-5,0,-2.1,-3.7,0,-2.3],
// 4 0 -3.7 0 -2.3 -5 0 -2.1 -4.8 0 -3 -3.3 0 -2.9
  [4,0,-3.7,0,-2.3,-5,0,-2.1,-4.8,0,-3,-3.3,0,-2.9],
// 4 0 -3.3 0 -2.9 -4.8 0 -3 -4 0 -3.5 -2.8 0 -3.3
  [4,0,-3.3,0,-2.9,-4.8,0,-3,-4,0,-3.5,-2.8,0,-3.3],
// 3 0 -2.8 0 -3.3 -4 0 -3.5 -3.1 0 -3.6
  [3,0,-2.8,0,-3.3,-4,0,-3.5,-3.1,0,-3.6],
// 4 353 2.9 0 4 0.6 0 5.6 -1.8 0 4 0.4 0 -1.7
  [4,353,2.9,0,4,0.6,0,5.6,-1.8,0,4,0.4,0,-1.7],
// 4 353 -3.6 0 0.2 0.4 0 -1.7 -1.8 0 4 -4 0 2.1
  [4,353,-3.6,0,0.2,0.4,0,-1.7,-1.8,0,4,-4,0,2.1],
// 3 353 -4 0 2.1 -4 0 0.3 -3.6 0 0.2
  [3,353,-4,0,2.1,-4,0,0.3,-3.6,0,0.2],
// 4 353 -4 0 0.3 -4 0 2.1 -5.4 0 0.5 -4.6 0 -0.1
  [4,353,-4,0,0.3,-4,0,2.1,-5.4,0,0.5,-4.6,0,-0.1],
// 4 353 -4.6 0 -0.1 -5.4 0 0.5 -6.1 0 -0.7 -4.9 0 -0.9
  [4,353,-4.6,0,-0.1,-5.4,0,0.5,-6.1,0,-0.7,-4.9,0,-0.9],
// 4 353 -4.9 0 -0.9 -6.1 0 -0.7 -6.3 0 -1.9 -5 0 -2.1
  [4,353,-4.9,0,-0.9,-6.1,0,-0.7,-6.3,0,-1.9,-5,0,-2.1],
// 4 353 -5 0 -2.1 -6.3 0 -1.9 -6.1 0 -3 -4.8 0 -3
  [4,353,-5,0,-2.1,-6.3,0,-1.9,-6.1,0,-3,-4.8,0,-3],
// 4 353 -4.8 0 -3 -6.1 0 -3 -5.4 0 -3.8 -4 0 -3.5
  [4,353,-4.8,0,-3,-6.1,0,-3,-5.4,0,-3.8,-4,0,-3.5],
// 4 353 -4 0 -3.5 -5.4 0 -3.8 -4.4 0 -4.5 -3.1 0 -3.6
  [4,353,-4,0,-3.5,-5.4,0,-3.8,-4.4,0,-4.5,-3.1,0,-3.6],
// 4 353 -3.1 0 -3.6 -4.4 0 -4.5 -3.5 0 -4.7 -2.4 0 -4.6
  [4,353,-3.1,0,-3.6,-4.4,0,-4.5,-3.5,0,-4.7,-2.4,0,-4.6],
// 4 353 -2.8 0 -3.3 -3.1 0 -3.6 -2.4 0 -4.6 -1.1 0 -3.7
  [4,353,-2.8,0,-3.3,-3.1,0,-3.6,-2.4,0,-4.6,-1.1,0,-3.7],
// 4 353 -2.8 0 -3.3 -1.1 0 -3.7 -3.6 0 0.2 -4 0 -0.7
  [4,353,-2.8,0,-3.3,-1.1,0,-3.7,-3.6,0,0.2,-4,0,-0.7],
// 4 353 -3.3 0 -2.9 -2.8 0 -3.3 -4 0 -0.7 -3.7 0 -2.3
  [4,353,-3.3,0,-2.9,-2.8,0,-3.3,-4,0,-0.7,-3.7,0,-2.3],
// 3 353 -4 0 -0.7 -4 0 -1.6 -3.7 0 -2.3
  [3,353,-4,0,-0.7,-4,0,-1.6,-3.7,0,-2.3],
// 4 353 -3.6 0 0.2 -1.1 0 -3.7 -0.3 0 -2.8 0.4 0 -1.7
  [4,353,-3.6,0,0.2,-1.1,0,-3.7,-0.3,0,-2.8,0.4,0,-1.7],
// 4 353 2.9 0 4 0.4 0 -1.7 1.4 0 -2.7 4.7 0 2
  [4,353,2.9,0,4,0.4,0,-1.7,1.4,0,-2.7,4.7,0,2],
// 4 353 4.7 0 2 1.4 0 -2.7 2.5 0 -3.5 5.8 0 0.4
  [4,353,4.7,0,2,1.4,0,-2.7,2.5,0,-3.5,5.8,0,0.4],
// 4 353 5.8 0 0.4 2.5 0 -3.5 3.7 0 -3.6 6.1 0 -0.6
  [4,353,5.8,0,0.4,2.5,0,-3.5,3.7,0,-3.6,6.1,0,-0.6],
// 4 353 6.1 0 -0.6 3.7 0 -3.6 4.9 0 -3.1 6.1 0 -1.5
  [4,353,6.1,0,-0.6,3.7,0,-3.6,4.9,0,-3.1,6.1,0,-1.5],
// 3 353 6.1 0 -1.5 4.9 0 -3.1 5.7 0 -2.5
  [3,353,6.1,0,-1.5,4.9,0,-3.1,5.7,0,-2.5],
// 4 0 1.1 0 6.5 0.4 0 6.5 0.6 0 5.6 2.9 0 4
  [4,0,1.1,0,6.5,0.4,0,6.5,0.6,0,5.6,2.9,0,4],
// 4 0 3.6 0 4.5 1.1 0 6.5 2.9 0 4 4.7 0 2
  [4,0,3.6,0,4.5,1.1,0,6.5,2.9,0,4,4.7,0,2],
// 4 0 5.5 0 2.3 3.6 0 4.5 4.7 0 2 5.8 0 0.4
  [4,0,5.5,0,2.3,3.6,0,4.5,4.7,0,2,5.8,0,0.4],
// 4 0 6.6 0 0.7 5.5 0 2.3 5.8 0 0.4 6.1 0 -0.6
  [4,0,6.6,0,0.7,5.5,0,2.3,5.8,0,0.4,6.1,0,-0.6],
// 4 0 6.9 0 -0.7 6.6 0 0.7 6.1 0 -0.6 6.1 0 -1.5
  [4,0,6.9,0,-0.7,6.6,0,0.7,6.1,0,-0.6,6.1,0,-1.5],
// 4 0 6.6 0 -2.1 6.9 0 -0.7 6.1 0 -1.5 5.7 0 -2.5
  [4,0,6.6,0,-2.1,6.9,0,-0.7,6.1,0,-1.5,5.7,0,-2.5],
// 4 0 6 0 -3.2 6.6 0 -2.1 5.7 0 -2.5 4.9 0 -3.1
  [4,0,6,0,-3.2,6.6,0,-2.1,5.7,0,-2.5,4.9,0,-3.1],
// 4 0 5 0 -3.9 6 0 -3.2 4.9 0 -3.1 3.7 0 -3.6
  [4,0,5,0,-3.9,6,0,-3.2,4.9,0,-3.1,3.7,0,-3.6],
// 4 0 3.7 0 -4.3 5 0 -3.9 3.7 0 -3.6 2.5 0 -3.5
  [4,0,3.7,0,-4.3,5,0,-3.9,3.7,0,-3.6,2.5,0,-3.5],
// 4 0 2.3 0 -4.2 3.7 0 -4.3 2.5 0 -3.5 1.4 0 -3.7
  [4,0,2.3,0,-4.2,3.7,0,-4.3,2.5,0,-3.5,1.4,0,-3.7],
// 4 0 1.4 0 -3.7 2.5 0 -3.5 1.4 0 -2.7 0.6 0 -2.9
  [4,0,1.4,0,-3.7,2.5,0,-3.5,1.4,0,-2.7,0.6,0,-2.9],
// 4 0 0.6 0 -2.9 1.4 0 -2.7 0.4 0 -1.7 -0.3 0 -2.8
  [4,0,0.6,0,-2.9,1.4,0,-2.7,0.4,0,-1.7,-0.3,0,-2.8],
// 4 0 -0.3 0 -4.2 0.6 0 -2.9 -0.3 0 -2.8 -1.1 0 -3.7
  [4,0,-0.3,0,-4.2,0.6,0,-2.9,-0.3,0,-2.8,-1.1,0,-3.7],
// 4 0 -1.3 0 -4.8 -0.3 0 -4.2 -1.1 0 -3.7 -2.4 0 -4.6
  [4,0,-1.3,0,-4.8,-0.3,0,-4.2,-1.1,0,-3.7,-2.4,0,-4.6],
// 4 0 -2.5 0 -5.3 -1.3 0 -4.8 -2.4 0 -4.6 -3.5 0 -4.7
  [4,0,-2.5,0,-5.3,-1.3,0,-4.8,-2.4,0,-4.6,-3.5,0,-4.7],
// 4 0 -3.7 0 -5.4 -2.5 0 -5.3 -3.5 0 -4.7 -4.4 0 -4.5
  [4,0,-3.7,0,-5.4,-2.5,0,-5.3,-3.5,0,-4.7,-4.4,0,-4.5],
// 4 0 -4.9 0 -5.1 -3.7 0 -5.4 -4.4 0 -4.5 -5.4 0 -3.8
  [4,0,-4.9,0,-5.1,-3.7,0,-5.4,-4.4,0,-4.5,-5.4,0,-3.8],
// 4 0 -5.9 0 -4.4 -4.9 0 -5.1 -5.4 0 -3.8 -6.1 0 -3
  [4,0,-5.9,0,-4.4,-4.9,0,-5.1,-5.4,0,-3.8,-6.1,0,-3],
// 4 0 -6.6 0 -3.5 -5.9 0 -4.4 -6.1 0 -3 -6.3 0 -1.9
  [4,0,-6.6,0,-3.5,-5.9,0,-4.4,-6.1,0,-3,-6.3,0,-1.9],
// 4 0 -7 0 -2.1 -6.6 0 -3.5 -6.3 0 -1.9 -6.9 0 -0.8
  [4,0,-7,0,-2.1,-6.6,0,-3.5,-6.3,0,-1.9,-6.9,0,-0.8],
// 4 0 -6.9 0 -0.8 -6.3 0 -1.9 -6.1 0 -0.7 -6.4 0 0.4
  [4,0,-6.9,0,-0.8,-6.3,0,-1.9,-6.1,0,-0.7,-6.4,0,0.4],
// 4 0 -6.4 0 0.4 -6.1 0 -0.7 -5.4 0 0.5 -5.4 0 1.8
  [4,0,-6.4,0,0.4,-6.1,0,-0.7,-5.4,0,0.5,-5.4,0,1.8],
// 4 0 -5.4 0 1.8 -5.4 0 0.5 -4 0 2.1 -3.6 0 3.6
  [4,0,-5.4,0,1.8,-5.4,0,0.5,-4,0,2.1,-3.6,0,3.6],
// 4 0 -3.6 0 3.6 -4 0 2.1 -1.8 0 4 -1.7 0 5.2
  [4,0,-3.6,0,3.6,-4,0,2.1,-1.8,0,4,-1.7,0,5.2],
// 4 0 -1.7 0 5.2 -1.8 0 4 0.6 0 5.6 0.4 0 6.5
  [4,0,-1.7,0,5.2,-1.8,0,4,0.6,0,5.6,0.4,0,6.5],
// 4 15 -9 0 0 -8.1 0 0 -8.1 0 3.8 -9 0 4.9
  [4,15,-9,0,0,-8.1,0,0,-8.1,0,3.8,-9,0,4.9],
// 4 15 -7.9 0 4.7 -9 0 4.9 -8.1 0 3.8 -7.2 0 3.6
  [4,15,-7.9,0,4.7,-9,0,4.9,-8.1,0,3.8,-7.2,0,3.6],
// 4 15 -7.9 0 4.7 -7.2 0 3.6 -6.9 0 6.4 -7.7 0 7.5
  [4,15,-7.9,0,4.7,-7.2,0,3.6,-6.9,0,6.4,-7.7,0,7.5],
// 4 15 -5.8 0 7.1 -7.7 0 7.5 -6.9 0 6.4 -4.4 0 5.8
  [4,15,-5.8,0,7.1,-7.7,0,7.5,-6.9,0,6.4,-4.4,0,5.8],
// 4 15 -5.8 0 7.1 -4.4 0 5.8 -5.5 0 9 -6.8 0 9
  [4,15,-5.8,0,7.1,-4.4,0,5.8,-5.5,0,9,-6.8,0,9],
// 4 15 8.1 0 5.5 8.1 0 0 9 0 0 9.1 0 6.5
  [4,15,8.1,0,5.5,8.1,0,0,9,0,0,9.1,0,6.5],
// 4 15 8.1 0 5.5 9.1 0 6.5 7 0 6.3 5.8 0 5
  [4,15,8.1,0,5.5,9.1,0,6.5,7,0,6.3,5.8,0,5],
// 4 15 6.3 0 9 5.8 0 5 7 0 6.3 7.4 0 9
  [4,15,6.3,0,9,5.8,0,5,7,0,6.3,7.4,0,9],
// 3 15 -0.7 0 -5 -1.7 0 -6.2 -0.7 0 -6.7
  [3,15,-0.7,0,-5,-1.7,0,-6.2,-0.7,0,-6.7],
// 3 15 1.1 0 -4.5 1.2 0 -6.5 2.7 0 -5.9
  [3,15,1.1,0,-4.5,1.2,0,-6.5,2.7,0,-5.9],
// 3 15 6.6 0 4.5 5.8 0 3 7.4 0 3.8
  [3,15,6.6,0,4.5,5.8,0,3,7.4,0,3.8],
// 3 15 -0.6 0 8.7 -1.7 0 8.7 -1.1 0 7.1
  [3,15,-0.6,0,8.7,-1.7,0,8.7,-1.1,0,7.1],
// 3 15 -5.9 0 4.7 -6.8 0 3.9 -5.4 0 3.2
  [3,15,-5.9,0,4.7,-6.8,0,3.9,-5.4,0,3.2],
// 3 353 3.7 0 8.3 3.4 0 5.9 5.1 0 7.9
  [3,353,3.7,0,8.3,3.4,0,5.9,5.1,0,7.9],
// 3 353 -3 0 8.1 -4.2 0 7.4 -2.8 0 5.9
  [3,353,-3,0,8.1,-4.2,0,7.4,-2.8,0,5.9],
// 4 14 -5.5 0 9 -1.7 0 8.7 -0.6 0 8.7 6.3 0 9
  [4,14,-5.5,0,9,-1.7,0,8.7,-0.6,0,8.7,6.3,0,9],
// 3 14 6.3 0 9 -0.6 0 8.7 3.7 0 8.3
  [3,14,6.3,0,9,-0.6,0,8.7,3.7,0,8.3],
// 3 14 6.3 0 9 3.7 0 8.3 5.1 0 7.9
  [3,14,6.3,0,9,3.7,0,8.3,5.1,0,7.9],
// 4 14 5.8 0 5 6.3 0 9 5.1 0 7.9 3.4 0 5.9
  [4,14,5.8,0,5,6.3,0,9,5.1,0,7.9,3.4,0,5.9],
// 4 14 5.8 0 5 3.4 0 5.9 3.6 0 4.5 5.8 0 3
  [4,14,5.8,0,5,3.4,0,5.9,3.6,0,4.5,5.8,0,3],
// 3 14 5.8 0 5 5.8 0 3 6.6 0 4.5
  [3,14,5.8,0,5,5.8,0,3,6.6,0,4.5],
// 3 14 8.1 0 5.5 5.8 0 5 6.6 0 4.5
  [3,14,8.1,0,5.5,5.8,0,5,6.6,0,4.5],
// 3 14 8.1 0 5.5 6.6 0 4.5 7.4 0 3.8
  [3,14,8.1,0,5.5,6.6,0,4.5,7.4,0,3.8],
// 4 14 8.1 0 0 8.1 0 5.5 7.4 0 3.8 6.6 0 0.7
  [4,14,8.1,0,0,8.1,0,5.5,7.4,0,3.8,6.6,0,0.7],
// 4 14 6.6 0 0.7 7.4 0 3.8 5.8 0 3 5.5 0 2.3
  [4,14,6.6,0,0.7,7.4,0,3.8,5.8,0,3,5.5,0,2.3],
// 3 14 3.6 0 4.5 5.5 0 2.3 5.8 0 3
  [3,14,3.6,0,4.5,5.5,0,2.3,5.8,0,3],
// 4 14 8.1 0 0 6.6 0 0.7 6.9 0 -0.7 7.48359 0 -3.09987
  [4,14,8.1,0,0,6.6,0,0.7,6.9,0,-0.7,7.48359,0,-3.09987],
// 3 14 6.9 0 -0.7 6.6 0 -2.1 7.48359 0 -3.09987
  [3,14,6.9,0,-0.7,6.6,0,-2.1,7.48359,0,-3.09987],
// 4 14 7.48359 0 -3.09987 6.6 0 -2.1 6 0 -3.2 5.72751 0 -5.72751
  [4,14,7.48359,0,-3.09987,6.6,0,-2.1,6,0,-3.2,5.72751,0,-5.72751],
// 3 14 6 0 -3.2 5 0 -3.9 5.72751 0 -5.72751
  [3,14,6,0,-3.2,5,0,-3.9,5.72751,0,-5.72751],
// 4 14 5.72751 0 -5.72751 5 0 -3.9 3.7 0 -4.3 2.7 0 -5.9
  [4,14,5.72751,0,-5.72751,5,0,-3.9,3.7,0,-4.3,2.7,0,-5.9],
// 4 14 3.09987 0 -7.48359 5.72751 0 -5.72751 2.7 0 -5.9 1.2 0 -6.5
  [4,14,3.09987,0,-7.48359,5.72751,0,-5.72751,2.7,0,-5.9,1.2,0,-6.5],
// 4 14 0 0 -8.1 3.09987 0 -7.48359 1.2 0 -6.5 -0.7 0 -6.7
  [4,14,0,0,-8.1,3.09987,0,-7.48359,1.2,0,-6.5,-0.7,0,-6.7],
// 4 14 -3.09987 0 -7.48359 0 0 -8.1 -0.7 0 -6.7 -1.7 0 -6.2
  [4,14,-3.09987,0,-7.48359,0,0,-8.1,-0.7,0,-6.7,-1.7,0,-6.2],
// 4 14 -2.5 0 -5.3 -3.09987 0 -7.48359 -1.7 0 -6.2 -1.3 0 -4.8
  [4,14,-2.5,0,-5.3,-3.09987,0,-7.48359,-1.7,0,-6.2,-1.3,0,-4.8],
// 4 14 -1.3 0 -4.8 -1.7 0 -6.2 -0.7 0 -5 -0.3 0 -4.2
  [4,14,-1.3,0,-4.8,-1.7,0,-6.2,-0.7,0,-5,-0.3,0,-4.2],
// 4 14 1.1 0 -4.5 -0.3 0 -4.2 -0.7 0 -5 -0.7 0 -6.7
  [4,14,1.1,0,-4.5,-0.3,0,-4.2,-0.7,0,-5,-0.7,0,-6.7],
// 3 14 1.1 0 -4.5 -0.7 0 -6.7 1.2 0 -6.5
  [3,14,1.1,0,-4.5,-0.7,0,-6.7,1.2,0,-6.5],
// 4 14 0.6 0 -2.9 -0.3 0 -4.2 1.1 0 -4.5 1.4 0 -3.7
  [4,14,0.6,0,-2.9,-0.3,0,-4.2,1.1,0,-4.5,1.4,0,-3.7],
// 4 14 2.3 0 -4.2 1.4 0 -3.7 1.1 0 -4.5 2.7 0 -5.9
  [4,14,2.3,0,-4.2,1.4,0,-3.7,1.1,0,-4.5,2.7,0,-5.9],
// 3 14 2.3 0 -4.2 2.7 0 -5.9 3.7 0 -4.3
  [3,14,2.3,0,-4.2,2.7,0,-5.9,3.7,0,-4.3],
// 3 14 -2.5 0 -5.3 -3.7 0 -5.4 -3.09987 0 -7.48359
  [3,14,-2.5,0,-5.3,-3.7,0,-5.4,-3.09987,0,-7.48359],
// 4 14 -3.09987 0 -7.48359 -3.7 0 -5.4 -4.9 0 -5.1 -5.72751 0 -5.72751
  [4,14,-3.09987,0,-7.48359,-3.7,0,-5.4,-4.9,0,-5.1,-5.72751,0,-5.72751],
// 3 14 -5.9 0 -4.4 -5.72751 0 -5.72751 -4.9 0 -5.1
  [3,14,-5.9,0,-4.4,-5.72751,0,-5.72751,-4.9,0,-5.1],
// 4 14 -5.72751 0 -5.72751 -5.9 0 -4.4 -6.6 0 -3.5 -7.48359 0 -3.09987
  [4,14,-5.72751,0,-5.72751,-5.9,0,-4.4,-6.6,0,-3.5,-7.48359,0,-3.09987],
// 4 14 -7.48359 0 -3.09987 -6.6 0 -3.5 -7 0 -2.1 -8.1 0 0
  [4,14,-7.48359,0,-3.09987,-6.6,0,-3.5,-7,0,-2.1,-8.1,0,0],
// 3 14 -8.1 0 0 -7 0 -2.1 -6.9 0 -0.8
  [3,14,-8.1,0,0,-7,0,-2.1,-6.9,0,-0.8],
// 3 14 -6.4 0 0.4 -8.1 0 0 -6.9 0 -0.8
  [3,14,-6.4,0,0.4,-8.1,0,0,-6.9,0,-0.8],
// 4 14 -8.1 0 0 -6.4 0 0.4 -5.4 0 1.8 -5.4 0 3.2
  [4,14,-8.1,0,0,-6.4,0,0.4,-5.4,0,1.8,-5.4,0,3.2],
// 4 14 -7.2 0 3.6 -8.1 0 0 -5.4 0 3.2 -6.8 0 3.9
  [4,14,-7.2,0,3.6,-8.1,0,0,-5.4,0,3.2,-6.8,0,3.9],
// 3 14 -8.1 0 3.8 -8.1 0 0 -7.2 0 3.6
  [3,14,-8.1,0,3.8,-8.1,0,0,-7.2,0,3.6],
// 4 14 -6.9 0 6.4 -7.2 0 3.6 -6.8 0 3.9 -5.9 0 4.7
  [4,14,-6.9,0,6.4,-7.2,0,3.6,-6.8,0,3.9,-5.9,0,4.7],
// 3 14 -6.9 0 6.4 -5.9 0 4.7 -4.4 0 5.8
  [3,14,-6.9,0,6.4,-5.9,0,4.7,-4.4,0,5.8],
// 4 14 -4.4 0 5.8 -5.9 0 4.7 -5.4 0 3.2 -3.6 0 3.6
  [4,14,-4.4,0,5.8,-5.9,0,4.7,-5.4,0,3.2,-3.6,0,3.6],
// 3 14 -3.6 0 3.6 -5.4 0 3.2 -5.4 0 1.8
  [3,14,-3.6,0,3.6,-5.4,0,3.2,-5.4,0,1.8],
// 4 14 -4.4 0 5.8 -3.6 0 3.6 -2.8 0 5.9 -4.2 0 7.4
  [4,14,-4.4,0,5.8,-3.6,0,3.6,-2.8,0,5.9,-4.2,0,7.4],
// 3 14 -5.5 0 9 -4.4 0 5.8 -4.2 0 7.4
  [3,14,-5.5,0,9,-4.4,0,5.8,-4.2,0,7.4],
// 3 14 -5.5 0 9 -4.2 0 7.4 -3 0 8.1
  [3,14,-5.5,0,9,-4.2,0,7.4,-3,0,8.1],
// 3 14 -5.5 0 9 -3 0 8.1 -1.7 0 8.7
  [3,14,-5.5,0,9,-3,0,8.1,-1.7,0,8.7],
// 4 14 -1.1 0 7.1 -1.7 0 8.7 -3 0 8.1 -2.8 0 5.9
  [4,14,-1.1,0,7.1,-1.7,0,8.7,-3,0,8.1,-2.8,0,5.9],
// 4 14 -1.7 0 5.2 -1.1 0 7.1 -2.8 0 5.9 -3.6 0 3.6
  [4,14,-1.7,0,5.2,-1.1,0,7.1,-2.8,0,5.9,-3.6,0,3.6],
// 3 14 -1.1 0 7.1 -1.7 0 5.2 0.4 0 6.5
  [3,14,-1.1,0,7.1,-1.7,0,5.2,0.4,0,6.5],
// 4 14 -0.6 0 8.7 -1.1 0 7.1 0.4 0 6.5 1.1 0 6.5
  [4,14,-0.6,0,8.7,-1.1,0,7.1,0.4,0,6.5,1.1,0,6.5],
// 4 14 3.7 0 8.3 -0.6 0 8.7 1.1 0 6.5 3.4 0 5.9
  [4,14,3.7,0,8.3,-0.6,0,8.7,1.1,0,6.5,3.4,0,5.9],
// 3 14 1.1 0 6.5 3.6 0 4.5 3.4 0 5.9
  [3,14,1.1,0,6.5,3.6,0,4.5,3.4,0,5.9],
// 4 10049 -6.8 0 9 -9 0 9 -7.7 0 7.5 -5.8 0 7.1
  [4,10049,-6.8,0,9,-9,0,9,-7.7,0,7.5,-5.8,0,7.1],
// 4 10049 -7.7 0 7.5 -9 0 9 -9 0 4.9 -7.9 0 4.7
  [4,10049,-7.7,0,7.5,-9,0,9,-9,0,4.9,-7.9,0,4.7],
// 4 10049 9.1 0 6.5 9 0 9 7.4 0 9 7 0 6.3
  [4,10049,9.1,0,6.5,9,0,9,7.4,0,9,7,0,6.3],
// 4 16 10 0 10 -10 0 10 -5.5 0 9 6.3 0 9
  [4,16,10,0,10,-10,0,10,-5.5,0,9,6.3,0,9],
// 3 16 10 0 10 6.3 0 9 7.4 0 9
  [3,16,10,0,10,6.3,0,9,7.4,0,9],
// 3 16 10 0 10 7.4 0 9 9 0 9
  [3,16,10,0,10,7.4,0,9,9,0,9],
// 4 16 10 0 10 9 0 9 9.1 0 6.5 10 0 0
  [4,16,10,0,10,9,0,9,9.1,0,6.5,10,0,0],
// 3 16 9.1 0 6.5 9 0 0 10 0 0
  [3,16,9.1,0,6.5,9,0,0,10,0,0],
// 3 16 -10 0 10 -6.8 0 9 -5.5 0 9
  [3,16,-10,0,10,-6.8,0,9,-5.5,0,9],
// 3 16 -10 0 10 -9 0 9 -6.8 0 9
  [3,16,-10,0,10,-9,0,9,-6.8,0,9],
// 4 16 -9 0 4.9 -9 0 9 -10 0 10 -10 0 0
  [4,16,-9,0,4.9,-9,0,9,-10,0,10,-10,0,0],
// 3 16 -9 0 4.9 -10 0 0 -9 0 0
  [3,16,-9,0,4.9,-10,0,0,-9,0,0],
];
module ldraw_lib__24246p08(step=0, col=false, unit=2/5, alt=false, line=0.2, solid=!$preview)
    makepoly(ldraw_lib__24246p08(), step=step, col=col, unit=unit, alt=alt, line=line, solid=solid);
ldraw_lib__24246p08(line=0.2);
